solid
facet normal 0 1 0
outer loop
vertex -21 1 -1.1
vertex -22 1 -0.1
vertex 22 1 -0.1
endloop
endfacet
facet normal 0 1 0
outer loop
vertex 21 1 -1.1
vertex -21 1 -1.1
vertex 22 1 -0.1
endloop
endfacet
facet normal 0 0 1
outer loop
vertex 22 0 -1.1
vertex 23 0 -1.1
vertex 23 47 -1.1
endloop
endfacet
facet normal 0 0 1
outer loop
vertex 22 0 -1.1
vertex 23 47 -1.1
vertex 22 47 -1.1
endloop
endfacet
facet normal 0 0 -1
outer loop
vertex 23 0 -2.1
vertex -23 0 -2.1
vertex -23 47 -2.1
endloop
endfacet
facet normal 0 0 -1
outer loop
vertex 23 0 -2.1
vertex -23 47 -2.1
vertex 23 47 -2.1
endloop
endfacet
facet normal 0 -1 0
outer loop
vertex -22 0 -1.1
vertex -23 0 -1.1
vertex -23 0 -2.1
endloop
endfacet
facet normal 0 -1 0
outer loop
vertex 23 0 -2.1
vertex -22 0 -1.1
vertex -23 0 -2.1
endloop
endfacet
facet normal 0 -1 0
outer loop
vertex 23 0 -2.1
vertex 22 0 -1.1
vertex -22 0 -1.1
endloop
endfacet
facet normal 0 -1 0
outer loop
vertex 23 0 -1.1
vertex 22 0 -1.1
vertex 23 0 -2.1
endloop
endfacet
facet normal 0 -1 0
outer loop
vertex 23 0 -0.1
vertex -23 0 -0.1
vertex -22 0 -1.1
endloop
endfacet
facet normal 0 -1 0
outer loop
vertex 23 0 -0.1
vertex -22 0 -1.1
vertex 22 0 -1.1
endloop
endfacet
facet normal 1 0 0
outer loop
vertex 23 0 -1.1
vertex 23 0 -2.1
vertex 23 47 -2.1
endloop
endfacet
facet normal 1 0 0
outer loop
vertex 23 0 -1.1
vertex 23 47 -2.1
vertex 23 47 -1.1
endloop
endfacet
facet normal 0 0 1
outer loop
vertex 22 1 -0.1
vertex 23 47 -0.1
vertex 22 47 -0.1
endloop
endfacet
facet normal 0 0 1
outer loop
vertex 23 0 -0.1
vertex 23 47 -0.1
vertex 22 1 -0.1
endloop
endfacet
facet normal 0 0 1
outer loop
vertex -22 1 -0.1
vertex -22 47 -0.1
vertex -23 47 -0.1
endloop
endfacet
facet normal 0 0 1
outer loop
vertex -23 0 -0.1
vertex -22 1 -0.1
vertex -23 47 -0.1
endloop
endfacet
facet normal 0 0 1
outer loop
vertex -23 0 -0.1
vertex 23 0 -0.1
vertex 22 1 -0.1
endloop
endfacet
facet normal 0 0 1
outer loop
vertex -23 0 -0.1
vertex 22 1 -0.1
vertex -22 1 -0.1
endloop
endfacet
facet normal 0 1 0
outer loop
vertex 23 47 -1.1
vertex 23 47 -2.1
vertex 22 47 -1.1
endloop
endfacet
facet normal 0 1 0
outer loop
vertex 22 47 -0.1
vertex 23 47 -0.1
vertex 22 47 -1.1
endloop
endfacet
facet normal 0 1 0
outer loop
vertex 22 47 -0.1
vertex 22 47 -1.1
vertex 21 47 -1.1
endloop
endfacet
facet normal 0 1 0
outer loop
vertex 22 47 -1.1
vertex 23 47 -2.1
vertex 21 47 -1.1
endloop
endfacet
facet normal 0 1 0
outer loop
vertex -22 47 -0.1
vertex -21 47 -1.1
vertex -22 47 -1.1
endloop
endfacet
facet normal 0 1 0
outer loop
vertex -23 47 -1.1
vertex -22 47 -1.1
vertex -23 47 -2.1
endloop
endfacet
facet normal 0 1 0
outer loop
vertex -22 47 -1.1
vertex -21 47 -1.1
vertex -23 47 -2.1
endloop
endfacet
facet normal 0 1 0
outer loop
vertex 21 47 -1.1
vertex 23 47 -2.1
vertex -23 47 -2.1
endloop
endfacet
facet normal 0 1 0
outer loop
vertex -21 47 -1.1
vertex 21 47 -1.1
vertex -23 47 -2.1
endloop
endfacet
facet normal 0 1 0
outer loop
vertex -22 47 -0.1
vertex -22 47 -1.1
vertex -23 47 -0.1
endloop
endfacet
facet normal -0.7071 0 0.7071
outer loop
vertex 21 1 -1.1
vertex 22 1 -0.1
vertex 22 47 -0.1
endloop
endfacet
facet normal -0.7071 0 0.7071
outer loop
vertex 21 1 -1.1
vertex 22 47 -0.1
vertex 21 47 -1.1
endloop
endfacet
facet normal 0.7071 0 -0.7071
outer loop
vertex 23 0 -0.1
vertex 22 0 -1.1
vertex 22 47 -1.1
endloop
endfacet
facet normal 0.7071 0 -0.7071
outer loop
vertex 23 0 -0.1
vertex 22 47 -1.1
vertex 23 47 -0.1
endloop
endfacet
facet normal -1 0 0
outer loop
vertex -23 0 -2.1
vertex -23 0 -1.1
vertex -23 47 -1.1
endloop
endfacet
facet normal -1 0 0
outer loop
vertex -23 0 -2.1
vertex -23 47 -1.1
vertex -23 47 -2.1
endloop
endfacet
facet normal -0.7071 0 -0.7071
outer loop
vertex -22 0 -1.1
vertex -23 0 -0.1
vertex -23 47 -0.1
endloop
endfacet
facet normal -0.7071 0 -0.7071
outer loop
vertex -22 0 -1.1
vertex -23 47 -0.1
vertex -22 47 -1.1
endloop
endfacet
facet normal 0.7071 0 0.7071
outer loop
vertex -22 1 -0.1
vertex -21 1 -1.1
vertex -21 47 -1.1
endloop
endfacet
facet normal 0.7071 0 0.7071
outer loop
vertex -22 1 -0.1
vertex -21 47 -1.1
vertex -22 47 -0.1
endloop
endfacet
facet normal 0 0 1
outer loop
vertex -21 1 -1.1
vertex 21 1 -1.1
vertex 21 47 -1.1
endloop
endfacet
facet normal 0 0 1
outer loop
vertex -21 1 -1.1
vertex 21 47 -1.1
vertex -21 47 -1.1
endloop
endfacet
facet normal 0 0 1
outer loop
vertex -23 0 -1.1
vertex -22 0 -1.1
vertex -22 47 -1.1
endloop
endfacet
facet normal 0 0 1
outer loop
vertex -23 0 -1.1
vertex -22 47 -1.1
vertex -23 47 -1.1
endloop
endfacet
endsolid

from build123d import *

# Parameters (mm, degrees)
EXTRUDE_1_DEPTH = 47
EXTRUDE_3_DEPTH = 1


with BuildPart() as part:
    # 草图1 → 凸台-拉伸1 (new body)
    with BuildSketch(Plane(origin=(0, 0, 0), x_dir=(1, 0, 0), z_dir=(0, 1, 0))):
        Polygon((-23, 2.1), (23, 2.1), (23, 1.1), (22, 1.1), (23, 0.1), (22, 0.1), (21, 1.1), (-21, 1.1), (-22, 0.1), (-23, 0.1), (-22, 1.1), (-23, 1.1), align=None)
    extrude(amount=EXTRUDE_1_DEPTH)

    # 草图2 → 凸台-拉伸3 (add)
    with BuildSketch(Plane.XZ):
        Polygon((22, -0.1), (-22, -0.1), (-21, -1.1), (21, -1.1), align=None)
    extrude(amount=-EXTRUDE_3_DEPTH)


solid = part.part
